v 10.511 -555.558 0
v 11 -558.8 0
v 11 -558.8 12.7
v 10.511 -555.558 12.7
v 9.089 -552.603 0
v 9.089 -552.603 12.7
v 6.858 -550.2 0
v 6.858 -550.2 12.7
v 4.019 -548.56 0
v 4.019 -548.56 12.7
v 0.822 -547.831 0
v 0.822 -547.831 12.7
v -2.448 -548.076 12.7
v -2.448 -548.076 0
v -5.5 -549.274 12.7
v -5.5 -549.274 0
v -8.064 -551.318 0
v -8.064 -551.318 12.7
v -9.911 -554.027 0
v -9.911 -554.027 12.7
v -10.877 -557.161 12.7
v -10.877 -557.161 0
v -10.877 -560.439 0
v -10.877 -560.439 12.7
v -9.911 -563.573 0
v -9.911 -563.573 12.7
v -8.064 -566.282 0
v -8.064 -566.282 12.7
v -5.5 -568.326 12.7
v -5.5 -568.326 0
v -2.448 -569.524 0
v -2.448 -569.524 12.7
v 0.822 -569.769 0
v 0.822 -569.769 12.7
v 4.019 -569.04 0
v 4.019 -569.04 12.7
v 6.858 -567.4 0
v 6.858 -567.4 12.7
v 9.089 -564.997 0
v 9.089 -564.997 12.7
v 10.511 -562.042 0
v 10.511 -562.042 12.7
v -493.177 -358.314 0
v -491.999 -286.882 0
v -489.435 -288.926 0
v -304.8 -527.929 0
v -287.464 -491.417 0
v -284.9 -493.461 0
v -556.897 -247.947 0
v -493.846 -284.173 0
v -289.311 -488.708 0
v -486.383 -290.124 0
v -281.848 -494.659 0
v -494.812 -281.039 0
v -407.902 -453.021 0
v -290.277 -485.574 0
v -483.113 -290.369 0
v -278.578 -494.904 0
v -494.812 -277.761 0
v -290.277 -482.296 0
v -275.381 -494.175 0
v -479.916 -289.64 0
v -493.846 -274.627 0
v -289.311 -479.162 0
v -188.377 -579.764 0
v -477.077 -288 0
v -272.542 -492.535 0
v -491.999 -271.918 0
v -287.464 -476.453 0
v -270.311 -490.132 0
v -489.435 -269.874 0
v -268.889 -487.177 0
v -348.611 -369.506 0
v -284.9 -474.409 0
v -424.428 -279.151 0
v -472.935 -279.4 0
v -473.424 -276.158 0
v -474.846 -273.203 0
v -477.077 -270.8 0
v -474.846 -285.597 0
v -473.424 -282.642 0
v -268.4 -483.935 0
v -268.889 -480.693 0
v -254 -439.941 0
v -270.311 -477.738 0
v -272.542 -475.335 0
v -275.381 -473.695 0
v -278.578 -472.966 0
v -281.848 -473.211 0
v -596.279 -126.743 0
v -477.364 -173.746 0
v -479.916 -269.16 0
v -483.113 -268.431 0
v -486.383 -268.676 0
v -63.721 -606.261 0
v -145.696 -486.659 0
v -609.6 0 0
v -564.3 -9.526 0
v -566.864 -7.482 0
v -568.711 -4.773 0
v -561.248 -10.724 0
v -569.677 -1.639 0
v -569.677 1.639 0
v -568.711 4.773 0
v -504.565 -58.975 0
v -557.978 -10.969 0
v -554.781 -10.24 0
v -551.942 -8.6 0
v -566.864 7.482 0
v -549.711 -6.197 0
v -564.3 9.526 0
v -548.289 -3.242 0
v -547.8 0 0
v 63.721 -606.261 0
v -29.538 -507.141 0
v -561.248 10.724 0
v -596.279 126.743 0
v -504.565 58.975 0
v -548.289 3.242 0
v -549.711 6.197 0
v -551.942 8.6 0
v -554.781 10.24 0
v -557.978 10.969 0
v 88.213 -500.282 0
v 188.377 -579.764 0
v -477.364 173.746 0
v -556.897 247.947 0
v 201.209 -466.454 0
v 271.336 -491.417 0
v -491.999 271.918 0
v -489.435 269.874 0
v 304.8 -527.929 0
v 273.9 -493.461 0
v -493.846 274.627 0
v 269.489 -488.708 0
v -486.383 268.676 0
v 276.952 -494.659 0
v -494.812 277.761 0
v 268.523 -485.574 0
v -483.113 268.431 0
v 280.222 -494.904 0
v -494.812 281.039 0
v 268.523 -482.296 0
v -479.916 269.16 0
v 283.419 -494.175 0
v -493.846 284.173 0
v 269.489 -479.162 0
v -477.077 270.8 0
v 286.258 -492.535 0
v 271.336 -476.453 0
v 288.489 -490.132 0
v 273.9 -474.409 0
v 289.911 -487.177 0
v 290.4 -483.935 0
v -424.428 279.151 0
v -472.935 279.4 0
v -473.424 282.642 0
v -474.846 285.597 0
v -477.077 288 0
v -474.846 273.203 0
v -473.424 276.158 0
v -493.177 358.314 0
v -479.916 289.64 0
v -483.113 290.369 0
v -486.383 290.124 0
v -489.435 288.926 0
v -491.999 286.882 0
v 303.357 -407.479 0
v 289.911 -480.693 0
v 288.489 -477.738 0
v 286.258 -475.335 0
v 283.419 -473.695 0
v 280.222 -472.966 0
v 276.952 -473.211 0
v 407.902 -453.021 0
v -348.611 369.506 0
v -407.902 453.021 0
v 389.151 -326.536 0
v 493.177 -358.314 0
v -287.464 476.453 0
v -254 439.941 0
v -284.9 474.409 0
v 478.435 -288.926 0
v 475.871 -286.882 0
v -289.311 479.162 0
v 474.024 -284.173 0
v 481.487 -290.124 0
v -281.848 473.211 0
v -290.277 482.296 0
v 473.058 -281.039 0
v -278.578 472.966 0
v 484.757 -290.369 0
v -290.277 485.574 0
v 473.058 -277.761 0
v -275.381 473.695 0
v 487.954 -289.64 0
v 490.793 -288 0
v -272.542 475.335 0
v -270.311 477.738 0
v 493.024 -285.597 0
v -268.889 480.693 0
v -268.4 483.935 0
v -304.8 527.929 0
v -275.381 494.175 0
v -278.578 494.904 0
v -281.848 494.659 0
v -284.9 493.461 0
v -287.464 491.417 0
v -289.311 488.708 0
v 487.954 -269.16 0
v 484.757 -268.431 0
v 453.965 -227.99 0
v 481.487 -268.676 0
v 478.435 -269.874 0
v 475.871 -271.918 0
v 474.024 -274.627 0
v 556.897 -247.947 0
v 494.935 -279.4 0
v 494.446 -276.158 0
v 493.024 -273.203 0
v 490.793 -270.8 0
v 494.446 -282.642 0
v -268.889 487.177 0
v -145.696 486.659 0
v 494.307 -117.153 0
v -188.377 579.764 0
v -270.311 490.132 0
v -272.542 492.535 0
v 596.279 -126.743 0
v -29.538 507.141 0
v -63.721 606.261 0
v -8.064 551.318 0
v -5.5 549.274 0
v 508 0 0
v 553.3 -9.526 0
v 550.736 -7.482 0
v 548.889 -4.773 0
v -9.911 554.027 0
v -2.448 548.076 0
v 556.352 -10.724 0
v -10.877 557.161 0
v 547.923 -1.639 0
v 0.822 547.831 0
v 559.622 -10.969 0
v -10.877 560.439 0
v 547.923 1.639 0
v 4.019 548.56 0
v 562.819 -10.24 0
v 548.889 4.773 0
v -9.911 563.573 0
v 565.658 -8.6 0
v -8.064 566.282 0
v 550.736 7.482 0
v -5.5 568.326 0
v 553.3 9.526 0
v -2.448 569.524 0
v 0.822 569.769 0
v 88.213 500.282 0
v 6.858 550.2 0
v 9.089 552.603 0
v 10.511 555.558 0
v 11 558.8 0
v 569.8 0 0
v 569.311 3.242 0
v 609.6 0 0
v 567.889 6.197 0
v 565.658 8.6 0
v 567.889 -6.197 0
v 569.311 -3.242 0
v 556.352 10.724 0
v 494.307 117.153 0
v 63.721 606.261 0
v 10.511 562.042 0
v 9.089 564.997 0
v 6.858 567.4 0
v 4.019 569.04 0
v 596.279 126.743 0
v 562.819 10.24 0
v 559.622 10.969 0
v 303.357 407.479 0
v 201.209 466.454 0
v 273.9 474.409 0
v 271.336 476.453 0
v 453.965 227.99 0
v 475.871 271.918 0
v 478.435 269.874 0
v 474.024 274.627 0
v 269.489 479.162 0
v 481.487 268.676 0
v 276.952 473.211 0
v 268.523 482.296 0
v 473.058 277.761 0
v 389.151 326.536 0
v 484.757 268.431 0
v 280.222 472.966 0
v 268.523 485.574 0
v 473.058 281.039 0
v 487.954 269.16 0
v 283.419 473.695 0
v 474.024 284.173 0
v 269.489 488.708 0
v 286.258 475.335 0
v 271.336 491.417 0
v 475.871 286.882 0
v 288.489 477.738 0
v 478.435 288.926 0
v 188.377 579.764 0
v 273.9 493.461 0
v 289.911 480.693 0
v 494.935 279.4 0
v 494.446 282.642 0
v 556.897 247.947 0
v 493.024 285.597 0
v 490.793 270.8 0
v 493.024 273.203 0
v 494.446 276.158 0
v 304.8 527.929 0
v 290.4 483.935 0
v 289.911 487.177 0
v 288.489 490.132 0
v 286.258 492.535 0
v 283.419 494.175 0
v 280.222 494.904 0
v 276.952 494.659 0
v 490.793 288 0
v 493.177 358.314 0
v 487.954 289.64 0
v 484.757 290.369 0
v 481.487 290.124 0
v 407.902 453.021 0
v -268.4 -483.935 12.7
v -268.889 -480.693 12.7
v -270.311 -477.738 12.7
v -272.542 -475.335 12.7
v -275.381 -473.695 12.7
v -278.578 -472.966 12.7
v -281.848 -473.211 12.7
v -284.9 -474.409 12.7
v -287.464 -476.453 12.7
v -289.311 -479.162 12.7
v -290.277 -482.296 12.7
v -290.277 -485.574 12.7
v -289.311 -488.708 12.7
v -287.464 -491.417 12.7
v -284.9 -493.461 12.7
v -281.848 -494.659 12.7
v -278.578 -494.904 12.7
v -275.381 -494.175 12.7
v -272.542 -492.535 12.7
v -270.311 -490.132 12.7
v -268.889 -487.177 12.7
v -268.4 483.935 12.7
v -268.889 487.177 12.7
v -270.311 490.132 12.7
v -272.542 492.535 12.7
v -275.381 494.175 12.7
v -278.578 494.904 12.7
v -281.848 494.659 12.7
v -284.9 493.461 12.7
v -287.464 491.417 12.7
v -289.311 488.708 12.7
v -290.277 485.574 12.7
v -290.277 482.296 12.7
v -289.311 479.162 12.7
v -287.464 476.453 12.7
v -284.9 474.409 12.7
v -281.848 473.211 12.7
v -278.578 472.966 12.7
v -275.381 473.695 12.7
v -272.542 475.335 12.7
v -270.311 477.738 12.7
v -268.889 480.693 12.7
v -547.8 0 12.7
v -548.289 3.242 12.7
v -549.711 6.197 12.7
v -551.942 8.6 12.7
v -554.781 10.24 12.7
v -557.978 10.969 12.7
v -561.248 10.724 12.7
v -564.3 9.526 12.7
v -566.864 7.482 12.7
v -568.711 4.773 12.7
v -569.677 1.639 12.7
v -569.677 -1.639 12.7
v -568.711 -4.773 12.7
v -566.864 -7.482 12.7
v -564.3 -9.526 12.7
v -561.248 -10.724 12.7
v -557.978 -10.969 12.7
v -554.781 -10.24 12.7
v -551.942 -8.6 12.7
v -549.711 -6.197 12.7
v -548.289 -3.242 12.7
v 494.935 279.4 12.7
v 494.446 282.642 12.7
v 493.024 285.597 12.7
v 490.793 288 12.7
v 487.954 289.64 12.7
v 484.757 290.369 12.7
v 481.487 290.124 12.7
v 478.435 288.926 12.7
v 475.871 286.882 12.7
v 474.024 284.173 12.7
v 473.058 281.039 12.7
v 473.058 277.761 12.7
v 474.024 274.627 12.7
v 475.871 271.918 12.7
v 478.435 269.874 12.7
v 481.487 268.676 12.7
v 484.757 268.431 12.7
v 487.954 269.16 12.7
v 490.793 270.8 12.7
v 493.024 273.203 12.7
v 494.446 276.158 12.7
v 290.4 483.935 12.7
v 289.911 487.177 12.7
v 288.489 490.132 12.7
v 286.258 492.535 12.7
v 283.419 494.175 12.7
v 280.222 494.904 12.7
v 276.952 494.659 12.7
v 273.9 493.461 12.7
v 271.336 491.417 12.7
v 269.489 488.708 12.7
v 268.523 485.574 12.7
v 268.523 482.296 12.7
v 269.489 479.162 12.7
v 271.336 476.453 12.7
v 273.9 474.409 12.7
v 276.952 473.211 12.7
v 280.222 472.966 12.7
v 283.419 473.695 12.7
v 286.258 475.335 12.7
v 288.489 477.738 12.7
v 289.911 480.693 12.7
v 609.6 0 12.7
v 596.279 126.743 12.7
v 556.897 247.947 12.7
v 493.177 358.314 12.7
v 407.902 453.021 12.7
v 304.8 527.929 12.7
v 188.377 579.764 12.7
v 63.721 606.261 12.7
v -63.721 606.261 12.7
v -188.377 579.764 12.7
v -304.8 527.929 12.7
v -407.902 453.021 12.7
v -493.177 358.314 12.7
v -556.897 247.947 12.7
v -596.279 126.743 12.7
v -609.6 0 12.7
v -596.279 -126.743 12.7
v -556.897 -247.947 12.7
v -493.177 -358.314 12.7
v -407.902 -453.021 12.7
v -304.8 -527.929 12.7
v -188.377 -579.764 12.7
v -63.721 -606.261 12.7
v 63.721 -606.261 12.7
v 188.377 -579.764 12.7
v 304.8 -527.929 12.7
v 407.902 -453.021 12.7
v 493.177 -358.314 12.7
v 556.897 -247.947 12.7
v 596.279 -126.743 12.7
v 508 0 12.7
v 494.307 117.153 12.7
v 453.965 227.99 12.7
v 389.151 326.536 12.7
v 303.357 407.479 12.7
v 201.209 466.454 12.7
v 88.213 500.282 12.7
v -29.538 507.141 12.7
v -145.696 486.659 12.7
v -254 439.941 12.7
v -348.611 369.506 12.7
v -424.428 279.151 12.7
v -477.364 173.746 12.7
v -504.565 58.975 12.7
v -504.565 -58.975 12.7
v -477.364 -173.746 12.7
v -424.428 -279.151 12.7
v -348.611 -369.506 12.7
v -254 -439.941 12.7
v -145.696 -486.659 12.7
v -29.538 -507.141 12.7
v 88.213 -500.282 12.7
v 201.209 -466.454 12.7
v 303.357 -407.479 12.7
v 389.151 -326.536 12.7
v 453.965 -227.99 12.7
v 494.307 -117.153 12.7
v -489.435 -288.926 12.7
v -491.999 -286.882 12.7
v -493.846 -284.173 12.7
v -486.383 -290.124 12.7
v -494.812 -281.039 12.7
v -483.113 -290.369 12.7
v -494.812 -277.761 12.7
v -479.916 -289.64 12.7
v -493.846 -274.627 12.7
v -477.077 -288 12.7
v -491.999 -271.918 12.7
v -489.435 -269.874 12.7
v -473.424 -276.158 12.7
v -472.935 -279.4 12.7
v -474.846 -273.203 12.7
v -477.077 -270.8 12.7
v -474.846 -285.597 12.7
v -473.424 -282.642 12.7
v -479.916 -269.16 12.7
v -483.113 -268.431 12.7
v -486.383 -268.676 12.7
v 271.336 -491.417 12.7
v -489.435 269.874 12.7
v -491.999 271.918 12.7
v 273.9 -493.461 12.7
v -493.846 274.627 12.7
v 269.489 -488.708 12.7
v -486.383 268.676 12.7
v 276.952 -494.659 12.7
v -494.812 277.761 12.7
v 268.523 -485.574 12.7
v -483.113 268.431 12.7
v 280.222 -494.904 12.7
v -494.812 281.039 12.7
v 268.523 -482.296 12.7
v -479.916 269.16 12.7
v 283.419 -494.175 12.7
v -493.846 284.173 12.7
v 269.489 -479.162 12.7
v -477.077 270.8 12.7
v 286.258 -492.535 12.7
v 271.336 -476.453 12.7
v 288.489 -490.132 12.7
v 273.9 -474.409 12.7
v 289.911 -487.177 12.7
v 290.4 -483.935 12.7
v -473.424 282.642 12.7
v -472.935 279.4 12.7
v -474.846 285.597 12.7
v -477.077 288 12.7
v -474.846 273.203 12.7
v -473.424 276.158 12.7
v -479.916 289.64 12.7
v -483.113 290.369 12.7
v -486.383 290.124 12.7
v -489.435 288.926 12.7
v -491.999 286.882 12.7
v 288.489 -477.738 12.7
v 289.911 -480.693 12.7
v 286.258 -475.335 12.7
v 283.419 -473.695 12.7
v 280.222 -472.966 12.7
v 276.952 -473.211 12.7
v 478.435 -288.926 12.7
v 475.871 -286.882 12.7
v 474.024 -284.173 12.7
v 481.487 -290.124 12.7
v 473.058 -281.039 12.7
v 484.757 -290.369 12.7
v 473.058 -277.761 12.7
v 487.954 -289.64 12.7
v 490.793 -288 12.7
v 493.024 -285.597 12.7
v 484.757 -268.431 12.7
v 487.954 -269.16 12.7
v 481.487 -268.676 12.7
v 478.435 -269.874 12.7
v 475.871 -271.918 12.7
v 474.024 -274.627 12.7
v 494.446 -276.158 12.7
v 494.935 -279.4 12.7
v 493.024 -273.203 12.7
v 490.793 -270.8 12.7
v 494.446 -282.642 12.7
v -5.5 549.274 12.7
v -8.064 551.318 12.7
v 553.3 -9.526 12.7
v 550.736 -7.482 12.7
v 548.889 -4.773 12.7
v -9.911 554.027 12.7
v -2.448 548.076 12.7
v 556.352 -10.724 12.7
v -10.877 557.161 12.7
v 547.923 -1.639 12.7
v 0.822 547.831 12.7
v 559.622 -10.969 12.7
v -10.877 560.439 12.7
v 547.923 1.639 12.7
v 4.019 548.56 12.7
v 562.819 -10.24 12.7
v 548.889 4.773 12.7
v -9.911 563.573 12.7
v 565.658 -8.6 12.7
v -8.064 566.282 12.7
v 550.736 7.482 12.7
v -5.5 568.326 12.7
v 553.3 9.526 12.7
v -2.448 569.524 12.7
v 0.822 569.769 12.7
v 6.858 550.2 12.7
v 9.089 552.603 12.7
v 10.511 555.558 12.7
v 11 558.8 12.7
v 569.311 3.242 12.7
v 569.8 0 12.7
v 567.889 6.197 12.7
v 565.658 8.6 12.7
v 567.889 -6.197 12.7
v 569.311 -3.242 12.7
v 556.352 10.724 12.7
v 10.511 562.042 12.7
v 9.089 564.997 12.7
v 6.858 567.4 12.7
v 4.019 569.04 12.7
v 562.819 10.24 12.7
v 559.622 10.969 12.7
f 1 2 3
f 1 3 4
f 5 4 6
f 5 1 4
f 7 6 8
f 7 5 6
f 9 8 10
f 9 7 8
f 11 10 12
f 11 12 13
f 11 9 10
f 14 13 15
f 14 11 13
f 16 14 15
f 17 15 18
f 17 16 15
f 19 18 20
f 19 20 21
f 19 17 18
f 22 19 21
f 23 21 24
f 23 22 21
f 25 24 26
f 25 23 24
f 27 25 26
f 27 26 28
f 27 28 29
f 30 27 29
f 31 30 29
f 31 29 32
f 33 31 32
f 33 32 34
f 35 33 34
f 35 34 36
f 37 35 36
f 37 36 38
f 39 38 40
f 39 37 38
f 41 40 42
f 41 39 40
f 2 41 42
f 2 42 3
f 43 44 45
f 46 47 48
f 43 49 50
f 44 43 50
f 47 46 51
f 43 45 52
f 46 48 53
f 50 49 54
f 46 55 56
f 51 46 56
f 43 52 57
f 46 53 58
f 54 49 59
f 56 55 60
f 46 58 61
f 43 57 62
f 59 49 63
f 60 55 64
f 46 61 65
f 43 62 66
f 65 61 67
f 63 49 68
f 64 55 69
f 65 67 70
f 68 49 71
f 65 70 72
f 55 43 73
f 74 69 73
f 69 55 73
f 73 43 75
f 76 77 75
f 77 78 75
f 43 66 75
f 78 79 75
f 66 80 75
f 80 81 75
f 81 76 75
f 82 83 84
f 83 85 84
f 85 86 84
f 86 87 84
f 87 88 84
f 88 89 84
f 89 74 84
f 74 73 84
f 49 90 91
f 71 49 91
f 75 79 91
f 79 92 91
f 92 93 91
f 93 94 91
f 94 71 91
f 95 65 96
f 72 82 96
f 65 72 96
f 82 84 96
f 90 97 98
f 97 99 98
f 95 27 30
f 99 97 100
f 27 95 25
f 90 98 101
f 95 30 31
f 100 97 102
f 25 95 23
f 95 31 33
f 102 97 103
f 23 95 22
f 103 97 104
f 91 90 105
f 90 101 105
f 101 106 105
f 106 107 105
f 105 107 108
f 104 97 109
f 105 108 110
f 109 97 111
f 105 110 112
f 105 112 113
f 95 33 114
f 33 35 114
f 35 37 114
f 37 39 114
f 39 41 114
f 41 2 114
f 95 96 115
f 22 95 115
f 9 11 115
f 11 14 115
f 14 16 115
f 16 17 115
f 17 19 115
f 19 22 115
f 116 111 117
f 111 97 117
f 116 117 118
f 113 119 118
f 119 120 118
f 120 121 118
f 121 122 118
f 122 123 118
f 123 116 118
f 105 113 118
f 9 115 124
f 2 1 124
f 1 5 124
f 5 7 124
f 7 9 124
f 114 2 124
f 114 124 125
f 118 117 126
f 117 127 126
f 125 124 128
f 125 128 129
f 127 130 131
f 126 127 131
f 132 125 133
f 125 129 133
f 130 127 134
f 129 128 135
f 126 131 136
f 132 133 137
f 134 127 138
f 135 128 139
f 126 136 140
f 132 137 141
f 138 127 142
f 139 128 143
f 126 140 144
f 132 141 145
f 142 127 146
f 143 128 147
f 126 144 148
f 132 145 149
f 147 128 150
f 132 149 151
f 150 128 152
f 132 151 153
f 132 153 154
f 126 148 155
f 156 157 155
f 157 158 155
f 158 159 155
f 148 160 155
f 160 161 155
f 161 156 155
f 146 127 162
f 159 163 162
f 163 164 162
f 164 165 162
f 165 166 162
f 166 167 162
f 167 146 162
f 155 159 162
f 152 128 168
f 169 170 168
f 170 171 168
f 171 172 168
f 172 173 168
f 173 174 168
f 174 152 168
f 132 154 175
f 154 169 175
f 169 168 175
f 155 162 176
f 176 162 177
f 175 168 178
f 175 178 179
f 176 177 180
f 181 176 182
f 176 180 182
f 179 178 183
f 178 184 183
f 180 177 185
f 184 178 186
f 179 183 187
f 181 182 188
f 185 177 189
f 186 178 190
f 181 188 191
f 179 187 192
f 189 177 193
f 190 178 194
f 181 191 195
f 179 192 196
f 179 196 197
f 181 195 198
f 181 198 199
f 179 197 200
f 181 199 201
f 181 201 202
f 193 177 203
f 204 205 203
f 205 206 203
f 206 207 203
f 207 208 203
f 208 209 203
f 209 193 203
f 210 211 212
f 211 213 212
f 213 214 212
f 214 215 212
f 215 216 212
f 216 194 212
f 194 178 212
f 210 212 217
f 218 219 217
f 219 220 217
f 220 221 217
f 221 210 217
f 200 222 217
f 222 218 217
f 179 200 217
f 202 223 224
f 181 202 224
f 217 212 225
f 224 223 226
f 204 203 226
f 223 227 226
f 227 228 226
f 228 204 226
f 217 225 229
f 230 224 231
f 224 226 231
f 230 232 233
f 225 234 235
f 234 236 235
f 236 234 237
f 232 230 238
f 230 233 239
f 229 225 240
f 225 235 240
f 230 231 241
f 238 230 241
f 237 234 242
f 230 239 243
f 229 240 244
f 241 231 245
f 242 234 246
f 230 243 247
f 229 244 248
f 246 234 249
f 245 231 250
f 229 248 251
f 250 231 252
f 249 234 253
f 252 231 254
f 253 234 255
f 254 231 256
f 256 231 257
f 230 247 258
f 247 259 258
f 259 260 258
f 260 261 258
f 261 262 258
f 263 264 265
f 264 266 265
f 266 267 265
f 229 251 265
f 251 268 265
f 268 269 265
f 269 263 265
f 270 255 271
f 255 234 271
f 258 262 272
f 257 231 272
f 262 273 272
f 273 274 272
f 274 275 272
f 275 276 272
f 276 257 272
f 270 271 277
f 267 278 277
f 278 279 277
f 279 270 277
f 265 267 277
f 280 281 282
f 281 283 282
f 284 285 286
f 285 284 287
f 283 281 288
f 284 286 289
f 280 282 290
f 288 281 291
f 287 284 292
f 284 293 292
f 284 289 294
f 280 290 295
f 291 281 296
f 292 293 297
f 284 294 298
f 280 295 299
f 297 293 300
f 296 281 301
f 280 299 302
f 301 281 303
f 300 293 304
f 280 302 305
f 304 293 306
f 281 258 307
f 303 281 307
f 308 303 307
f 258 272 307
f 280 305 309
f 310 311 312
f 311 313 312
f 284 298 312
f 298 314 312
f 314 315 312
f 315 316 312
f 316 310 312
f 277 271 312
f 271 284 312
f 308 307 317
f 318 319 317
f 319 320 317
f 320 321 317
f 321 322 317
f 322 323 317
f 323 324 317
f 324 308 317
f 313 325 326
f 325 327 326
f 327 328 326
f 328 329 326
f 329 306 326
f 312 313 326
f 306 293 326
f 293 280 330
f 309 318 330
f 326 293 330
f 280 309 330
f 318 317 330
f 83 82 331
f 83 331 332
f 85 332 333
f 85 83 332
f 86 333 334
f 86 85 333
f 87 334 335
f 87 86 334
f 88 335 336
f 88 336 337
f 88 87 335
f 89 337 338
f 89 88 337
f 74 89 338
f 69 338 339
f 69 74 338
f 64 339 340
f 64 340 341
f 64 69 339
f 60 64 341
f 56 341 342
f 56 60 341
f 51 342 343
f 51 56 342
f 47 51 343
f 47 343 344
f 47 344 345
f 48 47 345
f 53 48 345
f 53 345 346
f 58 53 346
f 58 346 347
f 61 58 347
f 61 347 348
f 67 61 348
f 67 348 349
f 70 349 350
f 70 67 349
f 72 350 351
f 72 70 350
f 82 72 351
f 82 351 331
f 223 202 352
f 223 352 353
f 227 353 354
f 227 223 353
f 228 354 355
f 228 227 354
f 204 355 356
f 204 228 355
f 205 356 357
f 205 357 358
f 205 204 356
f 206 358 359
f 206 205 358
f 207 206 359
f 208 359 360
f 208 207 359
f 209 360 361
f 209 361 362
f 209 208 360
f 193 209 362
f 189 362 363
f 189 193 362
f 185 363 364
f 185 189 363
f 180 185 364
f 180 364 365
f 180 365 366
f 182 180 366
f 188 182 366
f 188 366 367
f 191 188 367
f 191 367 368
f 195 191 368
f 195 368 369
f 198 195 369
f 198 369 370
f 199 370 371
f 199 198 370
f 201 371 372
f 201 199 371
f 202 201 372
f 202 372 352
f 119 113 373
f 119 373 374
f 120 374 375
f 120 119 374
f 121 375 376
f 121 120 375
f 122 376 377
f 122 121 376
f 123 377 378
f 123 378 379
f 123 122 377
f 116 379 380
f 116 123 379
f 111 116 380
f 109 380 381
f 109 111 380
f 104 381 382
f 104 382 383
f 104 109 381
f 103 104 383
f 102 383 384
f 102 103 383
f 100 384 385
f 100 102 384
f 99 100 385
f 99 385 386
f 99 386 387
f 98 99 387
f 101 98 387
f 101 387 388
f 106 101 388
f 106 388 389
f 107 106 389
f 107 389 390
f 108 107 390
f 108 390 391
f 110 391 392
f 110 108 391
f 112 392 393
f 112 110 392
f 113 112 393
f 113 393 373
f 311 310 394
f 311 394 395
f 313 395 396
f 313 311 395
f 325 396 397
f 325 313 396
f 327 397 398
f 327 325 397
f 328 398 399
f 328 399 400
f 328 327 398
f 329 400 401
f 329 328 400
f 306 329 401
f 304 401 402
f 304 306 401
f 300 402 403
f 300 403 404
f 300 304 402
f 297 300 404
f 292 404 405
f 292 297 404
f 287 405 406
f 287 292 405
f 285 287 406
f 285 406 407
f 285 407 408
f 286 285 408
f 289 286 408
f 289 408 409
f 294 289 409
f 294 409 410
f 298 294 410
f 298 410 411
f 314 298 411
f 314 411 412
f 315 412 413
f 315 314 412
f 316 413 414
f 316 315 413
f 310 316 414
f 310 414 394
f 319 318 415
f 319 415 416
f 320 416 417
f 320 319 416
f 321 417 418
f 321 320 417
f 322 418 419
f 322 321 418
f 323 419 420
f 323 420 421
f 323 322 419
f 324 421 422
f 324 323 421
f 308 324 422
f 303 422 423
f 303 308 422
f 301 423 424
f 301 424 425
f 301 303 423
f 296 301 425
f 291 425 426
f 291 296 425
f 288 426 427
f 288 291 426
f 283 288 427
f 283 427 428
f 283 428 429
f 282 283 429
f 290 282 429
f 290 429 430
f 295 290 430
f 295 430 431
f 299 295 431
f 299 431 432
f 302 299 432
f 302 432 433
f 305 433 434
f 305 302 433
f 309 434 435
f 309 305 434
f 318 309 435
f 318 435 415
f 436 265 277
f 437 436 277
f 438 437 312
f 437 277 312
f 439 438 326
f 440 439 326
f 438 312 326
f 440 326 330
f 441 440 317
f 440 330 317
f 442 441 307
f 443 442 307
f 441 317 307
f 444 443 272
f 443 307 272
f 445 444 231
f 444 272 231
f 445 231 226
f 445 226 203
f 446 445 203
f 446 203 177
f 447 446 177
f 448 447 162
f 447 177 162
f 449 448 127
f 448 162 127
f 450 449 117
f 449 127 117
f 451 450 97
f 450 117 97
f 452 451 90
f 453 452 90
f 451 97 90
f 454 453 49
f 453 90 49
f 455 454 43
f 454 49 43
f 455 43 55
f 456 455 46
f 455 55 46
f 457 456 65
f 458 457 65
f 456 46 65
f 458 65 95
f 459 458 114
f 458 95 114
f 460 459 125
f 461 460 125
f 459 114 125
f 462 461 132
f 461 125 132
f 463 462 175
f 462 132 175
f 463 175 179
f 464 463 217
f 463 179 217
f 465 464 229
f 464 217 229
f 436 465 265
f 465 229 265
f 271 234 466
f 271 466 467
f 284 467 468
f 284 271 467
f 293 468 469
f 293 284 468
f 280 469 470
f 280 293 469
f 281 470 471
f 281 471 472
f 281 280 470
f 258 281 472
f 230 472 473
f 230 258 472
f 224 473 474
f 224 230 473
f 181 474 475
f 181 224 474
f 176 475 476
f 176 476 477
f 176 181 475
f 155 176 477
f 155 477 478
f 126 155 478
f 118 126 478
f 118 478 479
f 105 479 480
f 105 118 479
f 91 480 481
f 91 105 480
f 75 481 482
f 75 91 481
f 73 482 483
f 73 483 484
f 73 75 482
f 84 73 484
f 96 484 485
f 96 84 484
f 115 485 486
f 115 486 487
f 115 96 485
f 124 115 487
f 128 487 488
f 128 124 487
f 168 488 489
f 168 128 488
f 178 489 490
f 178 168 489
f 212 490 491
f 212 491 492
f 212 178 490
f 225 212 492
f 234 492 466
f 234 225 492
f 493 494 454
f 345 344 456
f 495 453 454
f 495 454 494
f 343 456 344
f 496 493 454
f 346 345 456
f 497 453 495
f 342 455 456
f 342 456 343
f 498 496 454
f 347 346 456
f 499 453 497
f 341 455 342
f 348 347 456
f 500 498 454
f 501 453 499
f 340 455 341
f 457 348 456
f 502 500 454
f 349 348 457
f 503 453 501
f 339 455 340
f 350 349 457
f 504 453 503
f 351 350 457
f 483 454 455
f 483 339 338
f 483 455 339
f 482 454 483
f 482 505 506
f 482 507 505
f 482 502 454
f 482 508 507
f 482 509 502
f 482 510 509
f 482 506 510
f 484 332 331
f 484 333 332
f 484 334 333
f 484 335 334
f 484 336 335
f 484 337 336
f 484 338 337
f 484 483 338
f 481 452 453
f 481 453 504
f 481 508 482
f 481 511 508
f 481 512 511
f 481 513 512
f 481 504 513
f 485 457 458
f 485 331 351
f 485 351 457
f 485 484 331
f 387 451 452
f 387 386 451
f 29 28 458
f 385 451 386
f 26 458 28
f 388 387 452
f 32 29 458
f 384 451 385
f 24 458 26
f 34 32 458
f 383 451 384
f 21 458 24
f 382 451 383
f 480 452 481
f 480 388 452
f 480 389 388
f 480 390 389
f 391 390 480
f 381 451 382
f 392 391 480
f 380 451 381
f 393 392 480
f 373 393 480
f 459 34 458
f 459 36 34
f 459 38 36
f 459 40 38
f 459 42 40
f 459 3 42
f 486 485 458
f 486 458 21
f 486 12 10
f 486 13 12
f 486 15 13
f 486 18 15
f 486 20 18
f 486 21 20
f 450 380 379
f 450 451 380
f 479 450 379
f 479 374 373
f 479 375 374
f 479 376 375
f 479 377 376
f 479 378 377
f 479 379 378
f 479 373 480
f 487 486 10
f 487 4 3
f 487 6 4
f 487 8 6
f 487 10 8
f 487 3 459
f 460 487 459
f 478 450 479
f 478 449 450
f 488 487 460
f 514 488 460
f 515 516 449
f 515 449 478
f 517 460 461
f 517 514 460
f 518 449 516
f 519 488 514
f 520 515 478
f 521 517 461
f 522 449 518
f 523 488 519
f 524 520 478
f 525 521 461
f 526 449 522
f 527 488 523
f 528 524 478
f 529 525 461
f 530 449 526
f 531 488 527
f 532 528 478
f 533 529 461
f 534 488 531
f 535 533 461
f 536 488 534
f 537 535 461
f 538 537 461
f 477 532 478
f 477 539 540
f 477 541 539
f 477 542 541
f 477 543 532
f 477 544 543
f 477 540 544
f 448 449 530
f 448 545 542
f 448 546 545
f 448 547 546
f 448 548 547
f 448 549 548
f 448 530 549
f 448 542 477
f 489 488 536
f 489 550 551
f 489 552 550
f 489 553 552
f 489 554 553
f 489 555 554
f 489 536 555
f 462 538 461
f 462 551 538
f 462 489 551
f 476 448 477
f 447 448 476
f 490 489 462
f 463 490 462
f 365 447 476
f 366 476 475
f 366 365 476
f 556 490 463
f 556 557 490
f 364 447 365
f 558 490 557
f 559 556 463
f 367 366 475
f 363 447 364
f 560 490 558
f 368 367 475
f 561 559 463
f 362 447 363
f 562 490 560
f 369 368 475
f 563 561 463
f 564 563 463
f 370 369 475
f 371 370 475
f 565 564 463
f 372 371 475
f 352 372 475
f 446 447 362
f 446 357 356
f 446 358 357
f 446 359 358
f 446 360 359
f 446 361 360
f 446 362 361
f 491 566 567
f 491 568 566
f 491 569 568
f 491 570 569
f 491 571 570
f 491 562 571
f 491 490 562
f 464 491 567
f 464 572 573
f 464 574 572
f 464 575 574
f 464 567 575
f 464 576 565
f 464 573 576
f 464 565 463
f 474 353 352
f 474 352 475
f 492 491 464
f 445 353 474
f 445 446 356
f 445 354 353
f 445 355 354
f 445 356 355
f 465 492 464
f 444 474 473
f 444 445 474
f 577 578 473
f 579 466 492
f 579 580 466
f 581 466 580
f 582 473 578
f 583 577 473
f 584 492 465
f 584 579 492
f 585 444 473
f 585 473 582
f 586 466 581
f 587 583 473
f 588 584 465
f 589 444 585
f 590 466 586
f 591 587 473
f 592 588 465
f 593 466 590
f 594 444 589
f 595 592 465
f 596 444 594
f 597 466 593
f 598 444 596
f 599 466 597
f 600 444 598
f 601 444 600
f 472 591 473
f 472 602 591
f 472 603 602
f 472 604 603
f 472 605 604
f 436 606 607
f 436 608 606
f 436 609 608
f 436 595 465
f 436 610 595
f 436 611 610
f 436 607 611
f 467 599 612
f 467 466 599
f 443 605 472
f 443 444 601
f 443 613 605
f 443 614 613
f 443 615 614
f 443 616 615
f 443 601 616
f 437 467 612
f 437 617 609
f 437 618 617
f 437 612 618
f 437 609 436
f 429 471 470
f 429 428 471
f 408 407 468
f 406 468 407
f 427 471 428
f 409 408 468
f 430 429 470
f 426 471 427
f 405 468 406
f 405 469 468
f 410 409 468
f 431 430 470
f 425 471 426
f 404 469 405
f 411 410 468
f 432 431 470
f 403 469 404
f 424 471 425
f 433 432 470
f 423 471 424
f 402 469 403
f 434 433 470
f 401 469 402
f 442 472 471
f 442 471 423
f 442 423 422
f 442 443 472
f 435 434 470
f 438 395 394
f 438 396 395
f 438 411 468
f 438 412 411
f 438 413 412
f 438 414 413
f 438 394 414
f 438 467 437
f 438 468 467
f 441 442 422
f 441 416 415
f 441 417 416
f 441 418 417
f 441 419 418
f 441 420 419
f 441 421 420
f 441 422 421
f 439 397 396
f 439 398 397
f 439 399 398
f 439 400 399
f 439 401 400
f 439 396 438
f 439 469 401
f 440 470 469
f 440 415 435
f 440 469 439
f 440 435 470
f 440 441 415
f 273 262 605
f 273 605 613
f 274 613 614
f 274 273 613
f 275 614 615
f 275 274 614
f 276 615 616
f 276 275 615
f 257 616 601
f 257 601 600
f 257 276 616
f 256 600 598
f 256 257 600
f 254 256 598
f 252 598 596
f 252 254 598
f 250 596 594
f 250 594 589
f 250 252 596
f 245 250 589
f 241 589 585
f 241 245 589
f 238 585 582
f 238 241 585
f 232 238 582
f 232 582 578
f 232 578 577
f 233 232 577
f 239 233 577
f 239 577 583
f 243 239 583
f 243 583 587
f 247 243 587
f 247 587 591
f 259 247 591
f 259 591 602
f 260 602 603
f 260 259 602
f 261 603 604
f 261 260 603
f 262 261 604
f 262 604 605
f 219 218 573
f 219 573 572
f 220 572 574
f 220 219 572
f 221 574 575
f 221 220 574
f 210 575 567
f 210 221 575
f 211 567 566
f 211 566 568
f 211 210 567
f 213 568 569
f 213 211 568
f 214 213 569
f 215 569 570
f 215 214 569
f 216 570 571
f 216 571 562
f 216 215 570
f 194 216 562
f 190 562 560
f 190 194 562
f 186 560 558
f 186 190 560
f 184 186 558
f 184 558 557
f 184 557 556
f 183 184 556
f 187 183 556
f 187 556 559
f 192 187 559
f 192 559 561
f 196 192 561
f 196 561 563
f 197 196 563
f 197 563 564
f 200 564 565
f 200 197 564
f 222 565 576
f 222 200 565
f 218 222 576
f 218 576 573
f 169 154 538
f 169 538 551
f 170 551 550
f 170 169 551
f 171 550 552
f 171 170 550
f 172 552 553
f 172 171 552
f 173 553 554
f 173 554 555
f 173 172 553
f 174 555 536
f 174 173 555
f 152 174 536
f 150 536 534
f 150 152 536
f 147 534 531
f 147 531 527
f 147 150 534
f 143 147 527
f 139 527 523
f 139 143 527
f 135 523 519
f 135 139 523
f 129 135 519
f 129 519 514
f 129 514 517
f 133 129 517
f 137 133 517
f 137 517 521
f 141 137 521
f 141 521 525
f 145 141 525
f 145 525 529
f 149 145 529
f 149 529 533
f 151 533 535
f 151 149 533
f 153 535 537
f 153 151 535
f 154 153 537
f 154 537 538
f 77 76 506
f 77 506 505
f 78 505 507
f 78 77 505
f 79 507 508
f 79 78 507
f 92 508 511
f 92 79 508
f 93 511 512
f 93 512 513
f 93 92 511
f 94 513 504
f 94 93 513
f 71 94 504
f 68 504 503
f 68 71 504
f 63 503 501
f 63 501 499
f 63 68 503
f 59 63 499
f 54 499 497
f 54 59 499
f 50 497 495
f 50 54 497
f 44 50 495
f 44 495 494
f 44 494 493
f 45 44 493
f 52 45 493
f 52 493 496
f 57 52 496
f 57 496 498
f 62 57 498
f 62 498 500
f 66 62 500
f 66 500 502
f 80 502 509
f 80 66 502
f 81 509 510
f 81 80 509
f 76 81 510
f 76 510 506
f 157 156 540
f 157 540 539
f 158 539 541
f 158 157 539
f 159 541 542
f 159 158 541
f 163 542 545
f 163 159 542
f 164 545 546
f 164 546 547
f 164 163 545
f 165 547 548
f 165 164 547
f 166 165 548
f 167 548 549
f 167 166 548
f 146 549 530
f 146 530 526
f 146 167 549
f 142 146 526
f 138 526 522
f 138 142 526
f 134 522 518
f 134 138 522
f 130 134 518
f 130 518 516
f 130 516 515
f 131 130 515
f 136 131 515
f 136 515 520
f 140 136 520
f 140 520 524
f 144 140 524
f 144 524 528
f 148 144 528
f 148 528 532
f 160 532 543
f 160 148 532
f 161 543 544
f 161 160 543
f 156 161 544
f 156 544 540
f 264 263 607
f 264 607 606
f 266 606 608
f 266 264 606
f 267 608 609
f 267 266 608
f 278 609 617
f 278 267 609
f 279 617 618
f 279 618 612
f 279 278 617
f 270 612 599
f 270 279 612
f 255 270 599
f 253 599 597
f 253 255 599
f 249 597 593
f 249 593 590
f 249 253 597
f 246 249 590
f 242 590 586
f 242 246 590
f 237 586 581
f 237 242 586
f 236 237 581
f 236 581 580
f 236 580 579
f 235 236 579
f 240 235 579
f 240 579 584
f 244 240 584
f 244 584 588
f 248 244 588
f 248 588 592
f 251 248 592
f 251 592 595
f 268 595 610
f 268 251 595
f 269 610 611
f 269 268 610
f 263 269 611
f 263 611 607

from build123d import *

# Parameters (mm, degrees)
SKETCH1_R           = 609.6
SKETCH1_R_2         = 508
BOSS_EXTRUDE1_DEPTH = 12.7
SKETCH2_R           = 11
CUT_EXTRUDE1_DEPTH  = 12.7


with BuildPart() as part:
    # Sketch1 → Boss-Extrude1 (new body)
    with BuildSketch(Plane.XY):
        Circle(SKETCH1_R)
        Circle(SKETCH1_R_2, mode=Mode.SUBTRACT)
    extrude(amount=BOSS_EXTRUDE1_DEPTH)

    # Sketch2 → Cut-Extrude1 (cut)
    with BuildSketch(Plane.XY):
        with Locations((0, 215.685000111)):
            Circle(SKETCH2_R)
        with Locations((0, 558.8)):
            Circle(SKETCH2_R)
        with Locations((279.4, 483.934995635)):
            Circle(SKETCH2_R)
        with Locations((483.934995635, 279.4)):
            Circle(SKETCH2_R)
        with Locations((558.8, 0)):
            Circle(SKETCH2_R)
        with Locations((483.934995635, -279.4)):
            Circle(SKETCH2_R)
        with Locations((279.4, -483.934995635)):
            Circle(SKETCH2_R)
        with Locations((0, -558.8)):
            Circle(SKETCH2_R)
        with Locations((-279.4, -483.934995635)):
            Circle(SKETCH2_R)
        with Locations((-483.934995635, -279.4)):
            Circle(SKETCH2_R)
        with Locations((-558.8, 0)):
            Circle(SKETCH2_R)
        with Locations((-483.934995635, 279.4)):
            Circle(SKETCH2_R)
        with Locations((-279.4, 483.934995635)):
            Circle(SKETCH2_R)
    extrude(amount=CUT_EXTRUDE1_DEPTH, mode=Mode.SUBTRACT)


solid = part.part
